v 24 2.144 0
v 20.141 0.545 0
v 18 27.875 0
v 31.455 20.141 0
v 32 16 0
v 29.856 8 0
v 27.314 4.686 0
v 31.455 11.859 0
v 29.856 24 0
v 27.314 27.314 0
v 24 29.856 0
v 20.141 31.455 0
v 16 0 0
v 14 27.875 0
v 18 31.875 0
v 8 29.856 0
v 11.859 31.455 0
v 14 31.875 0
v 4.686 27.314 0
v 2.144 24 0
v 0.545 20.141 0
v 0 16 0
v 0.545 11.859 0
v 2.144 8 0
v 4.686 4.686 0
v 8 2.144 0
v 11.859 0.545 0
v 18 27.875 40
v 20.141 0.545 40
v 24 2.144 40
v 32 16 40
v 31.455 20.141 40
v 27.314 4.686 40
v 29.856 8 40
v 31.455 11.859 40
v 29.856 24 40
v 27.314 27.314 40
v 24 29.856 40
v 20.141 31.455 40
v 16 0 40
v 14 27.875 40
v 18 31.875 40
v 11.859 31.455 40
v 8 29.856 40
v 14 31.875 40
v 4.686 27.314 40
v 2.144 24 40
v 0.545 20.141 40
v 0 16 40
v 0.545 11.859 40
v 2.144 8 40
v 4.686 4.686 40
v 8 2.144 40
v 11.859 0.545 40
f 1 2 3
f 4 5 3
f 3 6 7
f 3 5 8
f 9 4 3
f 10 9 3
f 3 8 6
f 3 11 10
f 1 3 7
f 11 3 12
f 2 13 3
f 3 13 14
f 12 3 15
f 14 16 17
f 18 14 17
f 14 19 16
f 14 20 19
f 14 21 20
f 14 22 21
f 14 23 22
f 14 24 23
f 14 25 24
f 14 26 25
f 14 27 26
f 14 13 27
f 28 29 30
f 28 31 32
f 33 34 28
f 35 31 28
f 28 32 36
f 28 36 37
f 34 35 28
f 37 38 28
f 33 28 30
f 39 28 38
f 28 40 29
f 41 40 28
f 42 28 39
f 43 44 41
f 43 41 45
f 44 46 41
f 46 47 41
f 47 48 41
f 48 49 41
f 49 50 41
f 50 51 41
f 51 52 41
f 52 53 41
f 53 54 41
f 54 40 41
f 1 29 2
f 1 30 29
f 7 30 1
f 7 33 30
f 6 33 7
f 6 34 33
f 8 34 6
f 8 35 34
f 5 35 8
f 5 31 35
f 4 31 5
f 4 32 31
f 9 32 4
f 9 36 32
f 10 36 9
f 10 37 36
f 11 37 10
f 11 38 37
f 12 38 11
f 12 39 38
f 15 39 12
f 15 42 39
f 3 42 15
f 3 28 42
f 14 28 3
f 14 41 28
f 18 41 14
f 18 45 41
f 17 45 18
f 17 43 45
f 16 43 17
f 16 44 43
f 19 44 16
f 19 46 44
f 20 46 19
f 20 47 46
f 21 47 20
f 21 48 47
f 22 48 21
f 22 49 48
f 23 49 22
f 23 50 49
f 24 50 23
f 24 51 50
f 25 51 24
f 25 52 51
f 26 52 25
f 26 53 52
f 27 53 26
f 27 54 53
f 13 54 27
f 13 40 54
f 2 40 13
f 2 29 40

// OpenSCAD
$fn = 32;

// ----------------------------------------------------------------------
// Keyway shaft: d32 shaft, key 4 x 4 mm
// ----------------------------------------------------------------------

// --- parameters (mm) ---
shaft_r = 16;             // shaft radius
key_w = 4;                // keyway width
key_d = 4;                // keyway depth below the surface line
plate_t = 40;             // shaft length, Z (extrusion height)
fit_tol = 0.02;           // declared fit tolerance (prompt contract)
free_tol = 0.2;           // declared free tolerance (prompt contract)

shaft_d = 2 * shaft_r;  // shaft diameter
circle_step = 15;  // polygon sampling step, degrees

profile = [[11.859, 31.455], [8, 29.856], [4.686, 27.314], [2.144, 24], [0.545, 20.141], [0, 16], [0.545, 11.859], [2.144, 8], [4.686, 4.686], [8, 2.144], [11.859, 0.545], [16, 0], [20.141, 0.545], [24, 2.144], [27.314, 4.686], [29.856, 8], [31.455, 11.859], [32, 16], [31.455, 20.141], [29.856, 24], [27.314, 27.314], [24, 29.856], [20.141, 31.455], [18, 31.875], [18, 27.875], [14, 27.875], [14, 31.875]];  // primary outline, 27 points, counter clockwise

// --- the one profile operation ---
linear_extrude(height = plate_t) polygon(points = profile);
